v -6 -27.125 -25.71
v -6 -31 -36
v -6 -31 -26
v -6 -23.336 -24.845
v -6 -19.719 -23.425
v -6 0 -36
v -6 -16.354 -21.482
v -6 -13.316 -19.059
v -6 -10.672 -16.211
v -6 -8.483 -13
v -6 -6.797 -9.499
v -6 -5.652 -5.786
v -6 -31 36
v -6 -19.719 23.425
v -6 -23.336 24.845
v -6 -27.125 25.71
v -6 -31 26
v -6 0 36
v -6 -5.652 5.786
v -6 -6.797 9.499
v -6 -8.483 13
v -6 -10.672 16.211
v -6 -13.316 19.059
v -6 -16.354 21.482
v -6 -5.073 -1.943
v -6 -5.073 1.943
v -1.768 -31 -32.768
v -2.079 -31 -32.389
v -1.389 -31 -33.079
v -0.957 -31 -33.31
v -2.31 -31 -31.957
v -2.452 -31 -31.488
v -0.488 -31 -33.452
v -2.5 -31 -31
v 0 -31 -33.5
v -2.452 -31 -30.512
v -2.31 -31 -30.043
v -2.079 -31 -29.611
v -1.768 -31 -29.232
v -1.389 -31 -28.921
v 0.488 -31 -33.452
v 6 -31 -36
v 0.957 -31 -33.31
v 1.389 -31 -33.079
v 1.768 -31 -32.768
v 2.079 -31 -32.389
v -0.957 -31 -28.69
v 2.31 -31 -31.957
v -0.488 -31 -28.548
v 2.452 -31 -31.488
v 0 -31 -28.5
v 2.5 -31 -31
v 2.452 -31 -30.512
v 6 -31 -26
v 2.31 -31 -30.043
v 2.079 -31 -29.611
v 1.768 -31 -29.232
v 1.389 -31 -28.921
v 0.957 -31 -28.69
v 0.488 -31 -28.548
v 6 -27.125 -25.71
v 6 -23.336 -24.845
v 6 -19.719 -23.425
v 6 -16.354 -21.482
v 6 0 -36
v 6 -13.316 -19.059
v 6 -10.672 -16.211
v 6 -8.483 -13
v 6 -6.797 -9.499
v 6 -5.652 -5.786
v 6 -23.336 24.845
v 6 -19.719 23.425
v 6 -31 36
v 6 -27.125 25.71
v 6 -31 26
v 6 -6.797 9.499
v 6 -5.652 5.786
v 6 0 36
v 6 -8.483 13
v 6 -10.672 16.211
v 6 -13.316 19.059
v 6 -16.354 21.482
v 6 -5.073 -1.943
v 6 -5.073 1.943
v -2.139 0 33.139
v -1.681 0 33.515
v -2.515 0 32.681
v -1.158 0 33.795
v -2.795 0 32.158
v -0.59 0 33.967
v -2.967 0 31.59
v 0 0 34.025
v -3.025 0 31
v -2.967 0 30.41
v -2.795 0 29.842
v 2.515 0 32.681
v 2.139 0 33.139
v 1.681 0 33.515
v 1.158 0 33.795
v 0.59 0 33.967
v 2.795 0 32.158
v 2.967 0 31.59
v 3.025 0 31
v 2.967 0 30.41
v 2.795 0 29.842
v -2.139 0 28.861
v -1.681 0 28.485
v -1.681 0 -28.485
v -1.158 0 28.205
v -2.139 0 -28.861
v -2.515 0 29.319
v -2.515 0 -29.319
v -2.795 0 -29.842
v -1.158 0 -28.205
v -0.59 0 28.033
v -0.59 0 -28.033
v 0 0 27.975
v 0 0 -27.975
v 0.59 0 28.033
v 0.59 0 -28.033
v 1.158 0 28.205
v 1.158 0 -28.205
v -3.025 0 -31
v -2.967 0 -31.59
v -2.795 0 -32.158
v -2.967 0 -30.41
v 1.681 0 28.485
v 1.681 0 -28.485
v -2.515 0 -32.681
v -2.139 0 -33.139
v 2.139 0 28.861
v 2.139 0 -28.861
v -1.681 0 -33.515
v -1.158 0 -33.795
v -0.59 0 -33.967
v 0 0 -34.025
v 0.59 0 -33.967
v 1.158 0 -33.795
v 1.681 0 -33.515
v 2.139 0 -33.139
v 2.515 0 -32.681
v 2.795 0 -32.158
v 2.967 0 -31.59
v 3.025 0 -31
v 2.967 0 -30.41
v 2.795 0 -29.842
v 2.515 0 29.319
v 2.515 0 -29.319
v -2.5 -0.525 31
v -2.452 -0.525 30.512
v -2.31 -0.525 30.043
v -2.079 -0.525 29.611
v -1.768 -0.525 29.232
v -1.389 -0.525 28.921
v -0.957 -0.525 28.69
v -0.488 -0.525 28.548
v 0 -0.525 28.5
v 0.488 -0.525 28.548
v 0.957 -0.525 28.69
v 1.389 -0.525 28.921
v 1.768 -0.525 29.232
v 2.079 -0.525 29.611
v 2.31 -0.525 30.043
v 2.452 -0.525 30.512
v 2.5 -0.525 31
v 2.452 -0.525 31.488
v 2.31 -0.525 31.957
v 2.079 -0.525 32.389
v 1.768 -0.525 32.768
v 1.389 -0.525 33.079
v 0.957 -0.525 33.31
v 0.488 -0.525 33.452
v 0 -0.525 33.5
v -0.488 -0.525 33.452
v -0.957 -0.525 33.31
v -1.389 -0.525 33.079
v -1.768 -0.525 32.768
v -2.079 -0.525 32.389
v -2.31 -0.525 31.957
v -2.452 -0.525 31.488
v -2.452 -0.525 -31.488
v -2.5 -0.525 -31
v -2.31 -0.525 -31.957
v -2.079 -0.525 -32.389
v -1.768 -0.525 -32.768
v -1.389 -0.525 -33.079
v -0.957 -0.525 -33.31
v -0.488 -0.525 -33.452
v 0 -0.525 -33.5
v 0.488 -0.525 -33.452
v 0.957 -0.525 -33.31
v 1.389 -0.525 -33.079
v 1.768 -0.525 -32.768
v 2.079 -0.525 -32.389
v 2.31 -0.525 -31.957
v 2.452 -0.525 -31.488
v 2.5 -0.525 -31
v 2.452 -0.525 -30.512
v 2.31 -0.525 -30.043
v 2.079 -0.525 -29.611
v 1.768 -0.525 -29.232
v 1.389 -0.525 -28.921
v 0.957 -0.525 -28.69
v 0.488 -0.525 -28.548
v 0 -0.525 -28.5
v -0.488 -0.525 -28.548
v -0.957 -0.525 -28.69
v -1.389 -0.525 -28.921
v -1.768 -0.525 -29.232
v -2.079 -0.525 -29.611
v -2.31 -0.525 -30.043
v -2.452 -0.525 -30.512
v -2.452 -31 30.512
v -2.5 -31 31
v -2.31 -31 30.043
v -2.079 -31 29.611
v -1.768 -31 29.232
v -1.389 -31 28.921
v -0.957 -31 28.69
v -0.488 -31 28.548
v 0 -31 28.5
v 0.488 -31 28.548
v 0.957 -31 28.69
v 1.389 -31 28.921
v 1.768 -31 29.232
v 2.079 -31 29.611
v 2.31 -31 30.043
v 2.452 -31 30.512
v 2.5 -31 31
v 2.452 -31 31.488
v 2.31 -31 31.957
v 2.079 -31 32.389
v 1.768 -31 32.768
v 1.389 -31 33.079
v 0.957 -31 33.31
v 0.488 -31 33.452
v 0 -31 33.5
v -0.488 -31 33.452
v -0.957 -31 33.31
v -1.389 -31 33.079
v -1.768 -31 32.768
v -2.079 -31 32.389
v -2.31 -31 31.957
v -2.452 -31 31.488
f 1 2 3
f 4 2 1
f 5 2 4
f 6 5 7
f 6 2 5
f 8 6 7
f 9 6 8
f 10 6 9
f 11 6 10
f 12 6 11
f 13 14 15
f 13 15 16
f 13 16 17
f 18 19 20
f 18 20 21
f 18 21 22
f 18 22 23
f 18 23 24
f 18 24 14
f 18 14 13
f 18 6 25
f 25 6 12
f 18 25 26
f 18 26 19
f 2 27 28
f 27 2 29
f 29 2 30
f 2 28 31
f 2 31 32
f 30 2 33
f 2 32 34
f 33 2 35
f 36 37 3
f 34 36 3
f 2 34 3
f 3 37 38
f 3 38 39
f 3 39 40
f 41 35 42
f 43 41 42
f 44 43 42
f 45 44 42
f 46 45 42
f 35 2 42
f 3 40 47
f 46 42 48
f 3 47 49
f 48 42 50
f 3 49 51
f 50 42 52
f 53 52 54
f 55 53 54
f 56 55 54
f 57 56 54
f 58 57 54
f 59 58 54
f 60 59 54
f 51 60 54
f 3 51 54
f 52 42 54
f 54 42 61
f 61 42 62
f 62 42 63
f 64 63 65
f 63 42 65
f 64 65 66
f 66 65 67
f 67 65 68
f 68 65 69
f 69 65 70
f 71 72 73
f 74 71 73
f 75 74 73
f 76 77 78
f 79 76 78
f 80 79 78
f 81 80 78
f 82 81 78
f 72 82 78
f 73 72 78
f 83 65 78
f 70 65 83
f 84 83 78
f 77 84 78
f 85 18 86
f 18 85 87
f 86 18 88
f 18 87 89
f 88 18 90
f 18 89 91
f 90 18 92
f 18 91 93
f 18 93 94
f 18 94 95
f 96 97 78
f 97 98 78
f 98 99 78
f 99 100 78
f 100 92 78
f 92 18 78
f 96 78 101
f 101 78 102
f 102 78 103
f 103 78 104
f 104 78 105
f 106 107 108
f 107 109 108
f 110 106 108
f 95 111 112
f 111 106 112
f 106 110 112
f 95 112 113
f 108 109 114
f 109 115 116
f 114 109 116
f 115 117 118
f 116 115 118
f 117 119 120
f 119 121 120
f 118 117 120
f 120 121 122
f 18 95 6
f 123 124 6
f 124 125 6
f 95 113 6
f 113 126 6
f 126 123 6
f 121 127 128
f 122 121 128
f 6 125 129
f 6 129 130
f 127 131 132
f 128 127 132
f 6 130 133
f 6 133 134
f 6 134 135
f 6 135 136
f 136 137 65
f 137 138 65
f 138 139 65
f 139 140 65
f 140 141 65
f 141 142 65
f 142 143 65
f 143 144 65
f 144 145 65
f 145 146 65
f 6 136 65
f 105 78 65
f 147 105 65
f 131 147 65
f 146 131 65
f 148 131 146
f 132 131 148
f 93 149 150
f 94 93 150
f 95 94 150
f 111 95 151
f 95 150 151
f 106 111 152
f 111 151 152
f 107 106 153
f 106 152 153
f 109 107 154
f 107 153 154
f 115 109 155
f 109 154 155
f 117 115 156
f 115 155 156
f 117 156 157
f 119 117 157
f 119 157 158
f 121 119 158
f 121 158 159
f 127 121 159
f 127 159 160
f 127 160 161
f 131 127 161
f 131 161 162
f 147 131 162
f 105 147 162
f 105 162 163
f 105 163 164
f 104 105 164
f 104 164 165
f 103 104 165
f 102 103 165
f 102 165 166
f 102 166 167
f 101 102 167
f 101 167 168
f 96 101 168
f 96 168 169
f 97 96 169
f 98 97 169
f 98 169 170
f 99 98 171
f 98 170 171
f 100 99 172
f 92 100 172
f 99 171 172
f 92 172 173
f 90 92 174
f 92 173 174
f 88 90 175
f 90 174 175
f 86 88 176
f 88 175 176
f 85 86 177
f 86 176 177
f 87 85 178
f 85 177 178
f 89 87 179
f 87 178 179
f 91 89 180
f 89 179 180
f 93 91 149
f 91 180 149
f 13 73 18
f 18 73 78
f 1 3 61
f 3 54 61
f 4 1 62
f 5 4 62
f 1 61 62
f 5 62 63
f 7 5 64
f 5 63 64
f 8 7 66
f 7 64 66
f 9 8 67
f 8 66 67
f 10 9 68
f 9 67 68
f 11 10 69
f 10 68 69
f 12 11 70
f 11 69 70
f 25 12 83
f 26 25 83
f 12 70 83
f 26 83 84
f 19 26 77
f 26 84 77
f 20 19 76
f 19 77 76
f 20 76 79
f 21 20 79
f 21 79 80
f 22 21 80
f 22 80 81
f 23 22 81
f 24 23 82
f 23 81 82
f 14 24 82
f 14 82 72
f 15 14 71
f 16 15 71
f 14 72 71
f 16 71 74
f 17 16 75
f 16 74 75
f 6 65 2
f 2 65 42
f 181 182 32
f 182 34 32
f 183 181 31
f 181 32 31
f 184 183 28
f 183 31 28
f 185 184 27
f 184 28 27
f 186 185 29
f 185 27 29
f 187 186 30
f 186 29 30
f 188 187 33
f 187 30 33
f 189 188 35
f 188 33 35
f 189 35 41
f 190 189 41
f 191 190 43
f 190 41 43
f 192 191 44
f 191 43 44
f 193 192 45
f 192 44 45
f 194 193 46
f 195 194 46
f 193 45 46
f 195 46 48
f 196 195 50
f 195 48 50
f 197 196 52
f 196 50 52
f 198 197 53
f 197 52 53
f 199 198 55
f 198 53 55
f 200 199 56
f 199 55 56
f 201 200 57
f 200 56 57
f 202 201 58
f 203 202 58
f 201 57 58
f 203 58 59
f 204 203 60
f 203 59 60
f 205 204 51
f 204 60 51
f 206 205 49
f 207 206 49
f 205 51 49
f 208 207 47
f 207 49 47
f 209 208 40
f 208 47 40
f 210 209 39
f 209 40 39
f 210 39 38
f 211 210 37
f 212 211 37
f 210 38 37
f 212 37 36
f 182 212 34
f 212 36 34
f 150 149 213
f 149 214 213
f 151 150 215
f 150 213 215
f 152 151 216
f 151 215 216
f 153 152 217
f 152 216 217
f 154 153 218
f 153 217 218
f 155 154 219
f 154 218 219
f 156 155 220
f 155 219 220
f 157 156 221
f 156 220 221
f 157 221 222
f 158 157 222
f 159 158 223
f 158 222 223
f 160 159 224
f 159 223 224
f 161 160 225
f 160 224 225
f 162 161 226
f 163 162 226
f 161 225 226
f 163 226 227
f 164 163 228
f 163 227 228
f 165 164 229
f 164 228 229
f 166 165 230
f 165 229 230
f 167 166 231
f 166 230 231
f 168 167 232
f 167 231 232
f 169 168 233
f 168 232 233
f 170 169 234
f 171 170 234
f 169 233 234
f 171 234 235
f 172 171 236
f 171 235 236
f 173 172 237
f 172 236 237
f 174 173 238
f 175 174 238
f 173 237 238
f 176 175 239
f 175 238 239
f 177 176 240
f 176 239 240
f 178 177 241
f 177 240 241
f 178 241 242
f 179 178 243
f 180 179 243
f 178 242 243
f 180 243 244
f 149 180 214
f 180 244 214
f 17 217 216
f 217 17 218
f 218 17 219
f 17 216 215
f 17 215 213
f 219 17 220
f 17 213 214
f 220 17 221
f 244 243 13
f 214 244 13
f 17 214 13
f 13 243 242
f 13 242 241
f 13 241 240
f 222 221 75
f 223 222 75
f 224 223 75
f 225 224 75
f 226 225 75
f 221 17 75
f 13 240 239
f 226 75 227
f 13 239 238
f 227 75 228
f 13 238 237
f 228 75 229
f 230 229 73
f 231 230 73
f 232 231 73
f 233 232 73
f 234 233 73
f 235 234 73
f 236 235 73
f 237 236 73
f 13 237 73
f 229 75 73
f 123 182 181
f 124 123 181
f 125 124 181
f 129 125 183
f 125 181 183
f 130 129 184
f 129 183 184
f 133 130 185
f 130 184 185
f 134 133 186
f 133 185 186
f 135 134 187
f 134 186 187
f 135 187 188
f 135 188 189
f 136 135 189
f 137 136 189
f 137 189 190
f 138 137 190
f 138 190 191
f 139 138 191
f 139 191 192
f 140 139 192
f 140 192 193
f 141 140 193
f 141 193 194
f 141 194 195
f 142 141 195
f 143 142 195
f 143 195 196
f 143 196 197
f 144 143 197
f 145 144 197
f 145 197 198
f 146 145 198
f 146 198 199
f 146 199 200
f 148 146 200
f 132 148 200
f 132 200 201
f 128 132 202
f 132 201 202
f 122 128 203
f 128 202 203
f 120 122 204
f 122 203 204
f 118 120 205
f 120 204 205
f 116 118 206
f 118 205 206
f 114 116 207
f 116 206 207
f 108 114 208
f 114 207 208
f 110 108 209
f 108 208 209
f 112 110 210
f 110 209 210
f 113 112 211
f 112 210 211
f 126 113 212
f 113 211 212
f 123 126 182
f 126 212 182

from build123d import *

# Parameters (mm, degrees)
BOSS_EXTRUDE1_DEPTH         = 6
M6_TAPPED_HOLE1_D           = 5
M6_TAPPED_HOLE1_CSINK_D     = 6.05
M6_TAPPED_HOLE1_CSINK_ANGLE = 90


with BuildPart() as part:
    # Sketch1 → Boss-Extrude1 (new, symmetric)
    with BuildSketch(Plane(origin=(0, 0, 0), x_dir=(0, 0, -1), z_dir=(1, 0, 0))):
        with BuildLine():
            Line((-36, 0), (36, 0))
            Line((36, 0), (36, -31))
            Line((36, -31), (26, -31))
            ThreePointArc((26, -31), (0, -5), (-26, -31))
            Line((-26, -31), (-36, -31))
            Line((-36, -31), (-36, 0))
        make_face()
    extrude(amount=BOSS_EXTRUDE1_DEPTH, both=True)

    # M6 Tapped Hole1 (through all)
    with Locations(Plane(origin=(0, 0, 0), x_dir=(1, 0, 0), z_dir=(0, 1, 0))):
        with Locations((0, -31), (0, 31)):
            CounterSinkHole(M6_TAPPED_HOLE1_D / 2, M6_TAPPED_HOLE1_CSINK_D / 2, counter_sink_angle=M6_TAPPED_HOLE1_CSINK_ANGLE)


solid = part.part
